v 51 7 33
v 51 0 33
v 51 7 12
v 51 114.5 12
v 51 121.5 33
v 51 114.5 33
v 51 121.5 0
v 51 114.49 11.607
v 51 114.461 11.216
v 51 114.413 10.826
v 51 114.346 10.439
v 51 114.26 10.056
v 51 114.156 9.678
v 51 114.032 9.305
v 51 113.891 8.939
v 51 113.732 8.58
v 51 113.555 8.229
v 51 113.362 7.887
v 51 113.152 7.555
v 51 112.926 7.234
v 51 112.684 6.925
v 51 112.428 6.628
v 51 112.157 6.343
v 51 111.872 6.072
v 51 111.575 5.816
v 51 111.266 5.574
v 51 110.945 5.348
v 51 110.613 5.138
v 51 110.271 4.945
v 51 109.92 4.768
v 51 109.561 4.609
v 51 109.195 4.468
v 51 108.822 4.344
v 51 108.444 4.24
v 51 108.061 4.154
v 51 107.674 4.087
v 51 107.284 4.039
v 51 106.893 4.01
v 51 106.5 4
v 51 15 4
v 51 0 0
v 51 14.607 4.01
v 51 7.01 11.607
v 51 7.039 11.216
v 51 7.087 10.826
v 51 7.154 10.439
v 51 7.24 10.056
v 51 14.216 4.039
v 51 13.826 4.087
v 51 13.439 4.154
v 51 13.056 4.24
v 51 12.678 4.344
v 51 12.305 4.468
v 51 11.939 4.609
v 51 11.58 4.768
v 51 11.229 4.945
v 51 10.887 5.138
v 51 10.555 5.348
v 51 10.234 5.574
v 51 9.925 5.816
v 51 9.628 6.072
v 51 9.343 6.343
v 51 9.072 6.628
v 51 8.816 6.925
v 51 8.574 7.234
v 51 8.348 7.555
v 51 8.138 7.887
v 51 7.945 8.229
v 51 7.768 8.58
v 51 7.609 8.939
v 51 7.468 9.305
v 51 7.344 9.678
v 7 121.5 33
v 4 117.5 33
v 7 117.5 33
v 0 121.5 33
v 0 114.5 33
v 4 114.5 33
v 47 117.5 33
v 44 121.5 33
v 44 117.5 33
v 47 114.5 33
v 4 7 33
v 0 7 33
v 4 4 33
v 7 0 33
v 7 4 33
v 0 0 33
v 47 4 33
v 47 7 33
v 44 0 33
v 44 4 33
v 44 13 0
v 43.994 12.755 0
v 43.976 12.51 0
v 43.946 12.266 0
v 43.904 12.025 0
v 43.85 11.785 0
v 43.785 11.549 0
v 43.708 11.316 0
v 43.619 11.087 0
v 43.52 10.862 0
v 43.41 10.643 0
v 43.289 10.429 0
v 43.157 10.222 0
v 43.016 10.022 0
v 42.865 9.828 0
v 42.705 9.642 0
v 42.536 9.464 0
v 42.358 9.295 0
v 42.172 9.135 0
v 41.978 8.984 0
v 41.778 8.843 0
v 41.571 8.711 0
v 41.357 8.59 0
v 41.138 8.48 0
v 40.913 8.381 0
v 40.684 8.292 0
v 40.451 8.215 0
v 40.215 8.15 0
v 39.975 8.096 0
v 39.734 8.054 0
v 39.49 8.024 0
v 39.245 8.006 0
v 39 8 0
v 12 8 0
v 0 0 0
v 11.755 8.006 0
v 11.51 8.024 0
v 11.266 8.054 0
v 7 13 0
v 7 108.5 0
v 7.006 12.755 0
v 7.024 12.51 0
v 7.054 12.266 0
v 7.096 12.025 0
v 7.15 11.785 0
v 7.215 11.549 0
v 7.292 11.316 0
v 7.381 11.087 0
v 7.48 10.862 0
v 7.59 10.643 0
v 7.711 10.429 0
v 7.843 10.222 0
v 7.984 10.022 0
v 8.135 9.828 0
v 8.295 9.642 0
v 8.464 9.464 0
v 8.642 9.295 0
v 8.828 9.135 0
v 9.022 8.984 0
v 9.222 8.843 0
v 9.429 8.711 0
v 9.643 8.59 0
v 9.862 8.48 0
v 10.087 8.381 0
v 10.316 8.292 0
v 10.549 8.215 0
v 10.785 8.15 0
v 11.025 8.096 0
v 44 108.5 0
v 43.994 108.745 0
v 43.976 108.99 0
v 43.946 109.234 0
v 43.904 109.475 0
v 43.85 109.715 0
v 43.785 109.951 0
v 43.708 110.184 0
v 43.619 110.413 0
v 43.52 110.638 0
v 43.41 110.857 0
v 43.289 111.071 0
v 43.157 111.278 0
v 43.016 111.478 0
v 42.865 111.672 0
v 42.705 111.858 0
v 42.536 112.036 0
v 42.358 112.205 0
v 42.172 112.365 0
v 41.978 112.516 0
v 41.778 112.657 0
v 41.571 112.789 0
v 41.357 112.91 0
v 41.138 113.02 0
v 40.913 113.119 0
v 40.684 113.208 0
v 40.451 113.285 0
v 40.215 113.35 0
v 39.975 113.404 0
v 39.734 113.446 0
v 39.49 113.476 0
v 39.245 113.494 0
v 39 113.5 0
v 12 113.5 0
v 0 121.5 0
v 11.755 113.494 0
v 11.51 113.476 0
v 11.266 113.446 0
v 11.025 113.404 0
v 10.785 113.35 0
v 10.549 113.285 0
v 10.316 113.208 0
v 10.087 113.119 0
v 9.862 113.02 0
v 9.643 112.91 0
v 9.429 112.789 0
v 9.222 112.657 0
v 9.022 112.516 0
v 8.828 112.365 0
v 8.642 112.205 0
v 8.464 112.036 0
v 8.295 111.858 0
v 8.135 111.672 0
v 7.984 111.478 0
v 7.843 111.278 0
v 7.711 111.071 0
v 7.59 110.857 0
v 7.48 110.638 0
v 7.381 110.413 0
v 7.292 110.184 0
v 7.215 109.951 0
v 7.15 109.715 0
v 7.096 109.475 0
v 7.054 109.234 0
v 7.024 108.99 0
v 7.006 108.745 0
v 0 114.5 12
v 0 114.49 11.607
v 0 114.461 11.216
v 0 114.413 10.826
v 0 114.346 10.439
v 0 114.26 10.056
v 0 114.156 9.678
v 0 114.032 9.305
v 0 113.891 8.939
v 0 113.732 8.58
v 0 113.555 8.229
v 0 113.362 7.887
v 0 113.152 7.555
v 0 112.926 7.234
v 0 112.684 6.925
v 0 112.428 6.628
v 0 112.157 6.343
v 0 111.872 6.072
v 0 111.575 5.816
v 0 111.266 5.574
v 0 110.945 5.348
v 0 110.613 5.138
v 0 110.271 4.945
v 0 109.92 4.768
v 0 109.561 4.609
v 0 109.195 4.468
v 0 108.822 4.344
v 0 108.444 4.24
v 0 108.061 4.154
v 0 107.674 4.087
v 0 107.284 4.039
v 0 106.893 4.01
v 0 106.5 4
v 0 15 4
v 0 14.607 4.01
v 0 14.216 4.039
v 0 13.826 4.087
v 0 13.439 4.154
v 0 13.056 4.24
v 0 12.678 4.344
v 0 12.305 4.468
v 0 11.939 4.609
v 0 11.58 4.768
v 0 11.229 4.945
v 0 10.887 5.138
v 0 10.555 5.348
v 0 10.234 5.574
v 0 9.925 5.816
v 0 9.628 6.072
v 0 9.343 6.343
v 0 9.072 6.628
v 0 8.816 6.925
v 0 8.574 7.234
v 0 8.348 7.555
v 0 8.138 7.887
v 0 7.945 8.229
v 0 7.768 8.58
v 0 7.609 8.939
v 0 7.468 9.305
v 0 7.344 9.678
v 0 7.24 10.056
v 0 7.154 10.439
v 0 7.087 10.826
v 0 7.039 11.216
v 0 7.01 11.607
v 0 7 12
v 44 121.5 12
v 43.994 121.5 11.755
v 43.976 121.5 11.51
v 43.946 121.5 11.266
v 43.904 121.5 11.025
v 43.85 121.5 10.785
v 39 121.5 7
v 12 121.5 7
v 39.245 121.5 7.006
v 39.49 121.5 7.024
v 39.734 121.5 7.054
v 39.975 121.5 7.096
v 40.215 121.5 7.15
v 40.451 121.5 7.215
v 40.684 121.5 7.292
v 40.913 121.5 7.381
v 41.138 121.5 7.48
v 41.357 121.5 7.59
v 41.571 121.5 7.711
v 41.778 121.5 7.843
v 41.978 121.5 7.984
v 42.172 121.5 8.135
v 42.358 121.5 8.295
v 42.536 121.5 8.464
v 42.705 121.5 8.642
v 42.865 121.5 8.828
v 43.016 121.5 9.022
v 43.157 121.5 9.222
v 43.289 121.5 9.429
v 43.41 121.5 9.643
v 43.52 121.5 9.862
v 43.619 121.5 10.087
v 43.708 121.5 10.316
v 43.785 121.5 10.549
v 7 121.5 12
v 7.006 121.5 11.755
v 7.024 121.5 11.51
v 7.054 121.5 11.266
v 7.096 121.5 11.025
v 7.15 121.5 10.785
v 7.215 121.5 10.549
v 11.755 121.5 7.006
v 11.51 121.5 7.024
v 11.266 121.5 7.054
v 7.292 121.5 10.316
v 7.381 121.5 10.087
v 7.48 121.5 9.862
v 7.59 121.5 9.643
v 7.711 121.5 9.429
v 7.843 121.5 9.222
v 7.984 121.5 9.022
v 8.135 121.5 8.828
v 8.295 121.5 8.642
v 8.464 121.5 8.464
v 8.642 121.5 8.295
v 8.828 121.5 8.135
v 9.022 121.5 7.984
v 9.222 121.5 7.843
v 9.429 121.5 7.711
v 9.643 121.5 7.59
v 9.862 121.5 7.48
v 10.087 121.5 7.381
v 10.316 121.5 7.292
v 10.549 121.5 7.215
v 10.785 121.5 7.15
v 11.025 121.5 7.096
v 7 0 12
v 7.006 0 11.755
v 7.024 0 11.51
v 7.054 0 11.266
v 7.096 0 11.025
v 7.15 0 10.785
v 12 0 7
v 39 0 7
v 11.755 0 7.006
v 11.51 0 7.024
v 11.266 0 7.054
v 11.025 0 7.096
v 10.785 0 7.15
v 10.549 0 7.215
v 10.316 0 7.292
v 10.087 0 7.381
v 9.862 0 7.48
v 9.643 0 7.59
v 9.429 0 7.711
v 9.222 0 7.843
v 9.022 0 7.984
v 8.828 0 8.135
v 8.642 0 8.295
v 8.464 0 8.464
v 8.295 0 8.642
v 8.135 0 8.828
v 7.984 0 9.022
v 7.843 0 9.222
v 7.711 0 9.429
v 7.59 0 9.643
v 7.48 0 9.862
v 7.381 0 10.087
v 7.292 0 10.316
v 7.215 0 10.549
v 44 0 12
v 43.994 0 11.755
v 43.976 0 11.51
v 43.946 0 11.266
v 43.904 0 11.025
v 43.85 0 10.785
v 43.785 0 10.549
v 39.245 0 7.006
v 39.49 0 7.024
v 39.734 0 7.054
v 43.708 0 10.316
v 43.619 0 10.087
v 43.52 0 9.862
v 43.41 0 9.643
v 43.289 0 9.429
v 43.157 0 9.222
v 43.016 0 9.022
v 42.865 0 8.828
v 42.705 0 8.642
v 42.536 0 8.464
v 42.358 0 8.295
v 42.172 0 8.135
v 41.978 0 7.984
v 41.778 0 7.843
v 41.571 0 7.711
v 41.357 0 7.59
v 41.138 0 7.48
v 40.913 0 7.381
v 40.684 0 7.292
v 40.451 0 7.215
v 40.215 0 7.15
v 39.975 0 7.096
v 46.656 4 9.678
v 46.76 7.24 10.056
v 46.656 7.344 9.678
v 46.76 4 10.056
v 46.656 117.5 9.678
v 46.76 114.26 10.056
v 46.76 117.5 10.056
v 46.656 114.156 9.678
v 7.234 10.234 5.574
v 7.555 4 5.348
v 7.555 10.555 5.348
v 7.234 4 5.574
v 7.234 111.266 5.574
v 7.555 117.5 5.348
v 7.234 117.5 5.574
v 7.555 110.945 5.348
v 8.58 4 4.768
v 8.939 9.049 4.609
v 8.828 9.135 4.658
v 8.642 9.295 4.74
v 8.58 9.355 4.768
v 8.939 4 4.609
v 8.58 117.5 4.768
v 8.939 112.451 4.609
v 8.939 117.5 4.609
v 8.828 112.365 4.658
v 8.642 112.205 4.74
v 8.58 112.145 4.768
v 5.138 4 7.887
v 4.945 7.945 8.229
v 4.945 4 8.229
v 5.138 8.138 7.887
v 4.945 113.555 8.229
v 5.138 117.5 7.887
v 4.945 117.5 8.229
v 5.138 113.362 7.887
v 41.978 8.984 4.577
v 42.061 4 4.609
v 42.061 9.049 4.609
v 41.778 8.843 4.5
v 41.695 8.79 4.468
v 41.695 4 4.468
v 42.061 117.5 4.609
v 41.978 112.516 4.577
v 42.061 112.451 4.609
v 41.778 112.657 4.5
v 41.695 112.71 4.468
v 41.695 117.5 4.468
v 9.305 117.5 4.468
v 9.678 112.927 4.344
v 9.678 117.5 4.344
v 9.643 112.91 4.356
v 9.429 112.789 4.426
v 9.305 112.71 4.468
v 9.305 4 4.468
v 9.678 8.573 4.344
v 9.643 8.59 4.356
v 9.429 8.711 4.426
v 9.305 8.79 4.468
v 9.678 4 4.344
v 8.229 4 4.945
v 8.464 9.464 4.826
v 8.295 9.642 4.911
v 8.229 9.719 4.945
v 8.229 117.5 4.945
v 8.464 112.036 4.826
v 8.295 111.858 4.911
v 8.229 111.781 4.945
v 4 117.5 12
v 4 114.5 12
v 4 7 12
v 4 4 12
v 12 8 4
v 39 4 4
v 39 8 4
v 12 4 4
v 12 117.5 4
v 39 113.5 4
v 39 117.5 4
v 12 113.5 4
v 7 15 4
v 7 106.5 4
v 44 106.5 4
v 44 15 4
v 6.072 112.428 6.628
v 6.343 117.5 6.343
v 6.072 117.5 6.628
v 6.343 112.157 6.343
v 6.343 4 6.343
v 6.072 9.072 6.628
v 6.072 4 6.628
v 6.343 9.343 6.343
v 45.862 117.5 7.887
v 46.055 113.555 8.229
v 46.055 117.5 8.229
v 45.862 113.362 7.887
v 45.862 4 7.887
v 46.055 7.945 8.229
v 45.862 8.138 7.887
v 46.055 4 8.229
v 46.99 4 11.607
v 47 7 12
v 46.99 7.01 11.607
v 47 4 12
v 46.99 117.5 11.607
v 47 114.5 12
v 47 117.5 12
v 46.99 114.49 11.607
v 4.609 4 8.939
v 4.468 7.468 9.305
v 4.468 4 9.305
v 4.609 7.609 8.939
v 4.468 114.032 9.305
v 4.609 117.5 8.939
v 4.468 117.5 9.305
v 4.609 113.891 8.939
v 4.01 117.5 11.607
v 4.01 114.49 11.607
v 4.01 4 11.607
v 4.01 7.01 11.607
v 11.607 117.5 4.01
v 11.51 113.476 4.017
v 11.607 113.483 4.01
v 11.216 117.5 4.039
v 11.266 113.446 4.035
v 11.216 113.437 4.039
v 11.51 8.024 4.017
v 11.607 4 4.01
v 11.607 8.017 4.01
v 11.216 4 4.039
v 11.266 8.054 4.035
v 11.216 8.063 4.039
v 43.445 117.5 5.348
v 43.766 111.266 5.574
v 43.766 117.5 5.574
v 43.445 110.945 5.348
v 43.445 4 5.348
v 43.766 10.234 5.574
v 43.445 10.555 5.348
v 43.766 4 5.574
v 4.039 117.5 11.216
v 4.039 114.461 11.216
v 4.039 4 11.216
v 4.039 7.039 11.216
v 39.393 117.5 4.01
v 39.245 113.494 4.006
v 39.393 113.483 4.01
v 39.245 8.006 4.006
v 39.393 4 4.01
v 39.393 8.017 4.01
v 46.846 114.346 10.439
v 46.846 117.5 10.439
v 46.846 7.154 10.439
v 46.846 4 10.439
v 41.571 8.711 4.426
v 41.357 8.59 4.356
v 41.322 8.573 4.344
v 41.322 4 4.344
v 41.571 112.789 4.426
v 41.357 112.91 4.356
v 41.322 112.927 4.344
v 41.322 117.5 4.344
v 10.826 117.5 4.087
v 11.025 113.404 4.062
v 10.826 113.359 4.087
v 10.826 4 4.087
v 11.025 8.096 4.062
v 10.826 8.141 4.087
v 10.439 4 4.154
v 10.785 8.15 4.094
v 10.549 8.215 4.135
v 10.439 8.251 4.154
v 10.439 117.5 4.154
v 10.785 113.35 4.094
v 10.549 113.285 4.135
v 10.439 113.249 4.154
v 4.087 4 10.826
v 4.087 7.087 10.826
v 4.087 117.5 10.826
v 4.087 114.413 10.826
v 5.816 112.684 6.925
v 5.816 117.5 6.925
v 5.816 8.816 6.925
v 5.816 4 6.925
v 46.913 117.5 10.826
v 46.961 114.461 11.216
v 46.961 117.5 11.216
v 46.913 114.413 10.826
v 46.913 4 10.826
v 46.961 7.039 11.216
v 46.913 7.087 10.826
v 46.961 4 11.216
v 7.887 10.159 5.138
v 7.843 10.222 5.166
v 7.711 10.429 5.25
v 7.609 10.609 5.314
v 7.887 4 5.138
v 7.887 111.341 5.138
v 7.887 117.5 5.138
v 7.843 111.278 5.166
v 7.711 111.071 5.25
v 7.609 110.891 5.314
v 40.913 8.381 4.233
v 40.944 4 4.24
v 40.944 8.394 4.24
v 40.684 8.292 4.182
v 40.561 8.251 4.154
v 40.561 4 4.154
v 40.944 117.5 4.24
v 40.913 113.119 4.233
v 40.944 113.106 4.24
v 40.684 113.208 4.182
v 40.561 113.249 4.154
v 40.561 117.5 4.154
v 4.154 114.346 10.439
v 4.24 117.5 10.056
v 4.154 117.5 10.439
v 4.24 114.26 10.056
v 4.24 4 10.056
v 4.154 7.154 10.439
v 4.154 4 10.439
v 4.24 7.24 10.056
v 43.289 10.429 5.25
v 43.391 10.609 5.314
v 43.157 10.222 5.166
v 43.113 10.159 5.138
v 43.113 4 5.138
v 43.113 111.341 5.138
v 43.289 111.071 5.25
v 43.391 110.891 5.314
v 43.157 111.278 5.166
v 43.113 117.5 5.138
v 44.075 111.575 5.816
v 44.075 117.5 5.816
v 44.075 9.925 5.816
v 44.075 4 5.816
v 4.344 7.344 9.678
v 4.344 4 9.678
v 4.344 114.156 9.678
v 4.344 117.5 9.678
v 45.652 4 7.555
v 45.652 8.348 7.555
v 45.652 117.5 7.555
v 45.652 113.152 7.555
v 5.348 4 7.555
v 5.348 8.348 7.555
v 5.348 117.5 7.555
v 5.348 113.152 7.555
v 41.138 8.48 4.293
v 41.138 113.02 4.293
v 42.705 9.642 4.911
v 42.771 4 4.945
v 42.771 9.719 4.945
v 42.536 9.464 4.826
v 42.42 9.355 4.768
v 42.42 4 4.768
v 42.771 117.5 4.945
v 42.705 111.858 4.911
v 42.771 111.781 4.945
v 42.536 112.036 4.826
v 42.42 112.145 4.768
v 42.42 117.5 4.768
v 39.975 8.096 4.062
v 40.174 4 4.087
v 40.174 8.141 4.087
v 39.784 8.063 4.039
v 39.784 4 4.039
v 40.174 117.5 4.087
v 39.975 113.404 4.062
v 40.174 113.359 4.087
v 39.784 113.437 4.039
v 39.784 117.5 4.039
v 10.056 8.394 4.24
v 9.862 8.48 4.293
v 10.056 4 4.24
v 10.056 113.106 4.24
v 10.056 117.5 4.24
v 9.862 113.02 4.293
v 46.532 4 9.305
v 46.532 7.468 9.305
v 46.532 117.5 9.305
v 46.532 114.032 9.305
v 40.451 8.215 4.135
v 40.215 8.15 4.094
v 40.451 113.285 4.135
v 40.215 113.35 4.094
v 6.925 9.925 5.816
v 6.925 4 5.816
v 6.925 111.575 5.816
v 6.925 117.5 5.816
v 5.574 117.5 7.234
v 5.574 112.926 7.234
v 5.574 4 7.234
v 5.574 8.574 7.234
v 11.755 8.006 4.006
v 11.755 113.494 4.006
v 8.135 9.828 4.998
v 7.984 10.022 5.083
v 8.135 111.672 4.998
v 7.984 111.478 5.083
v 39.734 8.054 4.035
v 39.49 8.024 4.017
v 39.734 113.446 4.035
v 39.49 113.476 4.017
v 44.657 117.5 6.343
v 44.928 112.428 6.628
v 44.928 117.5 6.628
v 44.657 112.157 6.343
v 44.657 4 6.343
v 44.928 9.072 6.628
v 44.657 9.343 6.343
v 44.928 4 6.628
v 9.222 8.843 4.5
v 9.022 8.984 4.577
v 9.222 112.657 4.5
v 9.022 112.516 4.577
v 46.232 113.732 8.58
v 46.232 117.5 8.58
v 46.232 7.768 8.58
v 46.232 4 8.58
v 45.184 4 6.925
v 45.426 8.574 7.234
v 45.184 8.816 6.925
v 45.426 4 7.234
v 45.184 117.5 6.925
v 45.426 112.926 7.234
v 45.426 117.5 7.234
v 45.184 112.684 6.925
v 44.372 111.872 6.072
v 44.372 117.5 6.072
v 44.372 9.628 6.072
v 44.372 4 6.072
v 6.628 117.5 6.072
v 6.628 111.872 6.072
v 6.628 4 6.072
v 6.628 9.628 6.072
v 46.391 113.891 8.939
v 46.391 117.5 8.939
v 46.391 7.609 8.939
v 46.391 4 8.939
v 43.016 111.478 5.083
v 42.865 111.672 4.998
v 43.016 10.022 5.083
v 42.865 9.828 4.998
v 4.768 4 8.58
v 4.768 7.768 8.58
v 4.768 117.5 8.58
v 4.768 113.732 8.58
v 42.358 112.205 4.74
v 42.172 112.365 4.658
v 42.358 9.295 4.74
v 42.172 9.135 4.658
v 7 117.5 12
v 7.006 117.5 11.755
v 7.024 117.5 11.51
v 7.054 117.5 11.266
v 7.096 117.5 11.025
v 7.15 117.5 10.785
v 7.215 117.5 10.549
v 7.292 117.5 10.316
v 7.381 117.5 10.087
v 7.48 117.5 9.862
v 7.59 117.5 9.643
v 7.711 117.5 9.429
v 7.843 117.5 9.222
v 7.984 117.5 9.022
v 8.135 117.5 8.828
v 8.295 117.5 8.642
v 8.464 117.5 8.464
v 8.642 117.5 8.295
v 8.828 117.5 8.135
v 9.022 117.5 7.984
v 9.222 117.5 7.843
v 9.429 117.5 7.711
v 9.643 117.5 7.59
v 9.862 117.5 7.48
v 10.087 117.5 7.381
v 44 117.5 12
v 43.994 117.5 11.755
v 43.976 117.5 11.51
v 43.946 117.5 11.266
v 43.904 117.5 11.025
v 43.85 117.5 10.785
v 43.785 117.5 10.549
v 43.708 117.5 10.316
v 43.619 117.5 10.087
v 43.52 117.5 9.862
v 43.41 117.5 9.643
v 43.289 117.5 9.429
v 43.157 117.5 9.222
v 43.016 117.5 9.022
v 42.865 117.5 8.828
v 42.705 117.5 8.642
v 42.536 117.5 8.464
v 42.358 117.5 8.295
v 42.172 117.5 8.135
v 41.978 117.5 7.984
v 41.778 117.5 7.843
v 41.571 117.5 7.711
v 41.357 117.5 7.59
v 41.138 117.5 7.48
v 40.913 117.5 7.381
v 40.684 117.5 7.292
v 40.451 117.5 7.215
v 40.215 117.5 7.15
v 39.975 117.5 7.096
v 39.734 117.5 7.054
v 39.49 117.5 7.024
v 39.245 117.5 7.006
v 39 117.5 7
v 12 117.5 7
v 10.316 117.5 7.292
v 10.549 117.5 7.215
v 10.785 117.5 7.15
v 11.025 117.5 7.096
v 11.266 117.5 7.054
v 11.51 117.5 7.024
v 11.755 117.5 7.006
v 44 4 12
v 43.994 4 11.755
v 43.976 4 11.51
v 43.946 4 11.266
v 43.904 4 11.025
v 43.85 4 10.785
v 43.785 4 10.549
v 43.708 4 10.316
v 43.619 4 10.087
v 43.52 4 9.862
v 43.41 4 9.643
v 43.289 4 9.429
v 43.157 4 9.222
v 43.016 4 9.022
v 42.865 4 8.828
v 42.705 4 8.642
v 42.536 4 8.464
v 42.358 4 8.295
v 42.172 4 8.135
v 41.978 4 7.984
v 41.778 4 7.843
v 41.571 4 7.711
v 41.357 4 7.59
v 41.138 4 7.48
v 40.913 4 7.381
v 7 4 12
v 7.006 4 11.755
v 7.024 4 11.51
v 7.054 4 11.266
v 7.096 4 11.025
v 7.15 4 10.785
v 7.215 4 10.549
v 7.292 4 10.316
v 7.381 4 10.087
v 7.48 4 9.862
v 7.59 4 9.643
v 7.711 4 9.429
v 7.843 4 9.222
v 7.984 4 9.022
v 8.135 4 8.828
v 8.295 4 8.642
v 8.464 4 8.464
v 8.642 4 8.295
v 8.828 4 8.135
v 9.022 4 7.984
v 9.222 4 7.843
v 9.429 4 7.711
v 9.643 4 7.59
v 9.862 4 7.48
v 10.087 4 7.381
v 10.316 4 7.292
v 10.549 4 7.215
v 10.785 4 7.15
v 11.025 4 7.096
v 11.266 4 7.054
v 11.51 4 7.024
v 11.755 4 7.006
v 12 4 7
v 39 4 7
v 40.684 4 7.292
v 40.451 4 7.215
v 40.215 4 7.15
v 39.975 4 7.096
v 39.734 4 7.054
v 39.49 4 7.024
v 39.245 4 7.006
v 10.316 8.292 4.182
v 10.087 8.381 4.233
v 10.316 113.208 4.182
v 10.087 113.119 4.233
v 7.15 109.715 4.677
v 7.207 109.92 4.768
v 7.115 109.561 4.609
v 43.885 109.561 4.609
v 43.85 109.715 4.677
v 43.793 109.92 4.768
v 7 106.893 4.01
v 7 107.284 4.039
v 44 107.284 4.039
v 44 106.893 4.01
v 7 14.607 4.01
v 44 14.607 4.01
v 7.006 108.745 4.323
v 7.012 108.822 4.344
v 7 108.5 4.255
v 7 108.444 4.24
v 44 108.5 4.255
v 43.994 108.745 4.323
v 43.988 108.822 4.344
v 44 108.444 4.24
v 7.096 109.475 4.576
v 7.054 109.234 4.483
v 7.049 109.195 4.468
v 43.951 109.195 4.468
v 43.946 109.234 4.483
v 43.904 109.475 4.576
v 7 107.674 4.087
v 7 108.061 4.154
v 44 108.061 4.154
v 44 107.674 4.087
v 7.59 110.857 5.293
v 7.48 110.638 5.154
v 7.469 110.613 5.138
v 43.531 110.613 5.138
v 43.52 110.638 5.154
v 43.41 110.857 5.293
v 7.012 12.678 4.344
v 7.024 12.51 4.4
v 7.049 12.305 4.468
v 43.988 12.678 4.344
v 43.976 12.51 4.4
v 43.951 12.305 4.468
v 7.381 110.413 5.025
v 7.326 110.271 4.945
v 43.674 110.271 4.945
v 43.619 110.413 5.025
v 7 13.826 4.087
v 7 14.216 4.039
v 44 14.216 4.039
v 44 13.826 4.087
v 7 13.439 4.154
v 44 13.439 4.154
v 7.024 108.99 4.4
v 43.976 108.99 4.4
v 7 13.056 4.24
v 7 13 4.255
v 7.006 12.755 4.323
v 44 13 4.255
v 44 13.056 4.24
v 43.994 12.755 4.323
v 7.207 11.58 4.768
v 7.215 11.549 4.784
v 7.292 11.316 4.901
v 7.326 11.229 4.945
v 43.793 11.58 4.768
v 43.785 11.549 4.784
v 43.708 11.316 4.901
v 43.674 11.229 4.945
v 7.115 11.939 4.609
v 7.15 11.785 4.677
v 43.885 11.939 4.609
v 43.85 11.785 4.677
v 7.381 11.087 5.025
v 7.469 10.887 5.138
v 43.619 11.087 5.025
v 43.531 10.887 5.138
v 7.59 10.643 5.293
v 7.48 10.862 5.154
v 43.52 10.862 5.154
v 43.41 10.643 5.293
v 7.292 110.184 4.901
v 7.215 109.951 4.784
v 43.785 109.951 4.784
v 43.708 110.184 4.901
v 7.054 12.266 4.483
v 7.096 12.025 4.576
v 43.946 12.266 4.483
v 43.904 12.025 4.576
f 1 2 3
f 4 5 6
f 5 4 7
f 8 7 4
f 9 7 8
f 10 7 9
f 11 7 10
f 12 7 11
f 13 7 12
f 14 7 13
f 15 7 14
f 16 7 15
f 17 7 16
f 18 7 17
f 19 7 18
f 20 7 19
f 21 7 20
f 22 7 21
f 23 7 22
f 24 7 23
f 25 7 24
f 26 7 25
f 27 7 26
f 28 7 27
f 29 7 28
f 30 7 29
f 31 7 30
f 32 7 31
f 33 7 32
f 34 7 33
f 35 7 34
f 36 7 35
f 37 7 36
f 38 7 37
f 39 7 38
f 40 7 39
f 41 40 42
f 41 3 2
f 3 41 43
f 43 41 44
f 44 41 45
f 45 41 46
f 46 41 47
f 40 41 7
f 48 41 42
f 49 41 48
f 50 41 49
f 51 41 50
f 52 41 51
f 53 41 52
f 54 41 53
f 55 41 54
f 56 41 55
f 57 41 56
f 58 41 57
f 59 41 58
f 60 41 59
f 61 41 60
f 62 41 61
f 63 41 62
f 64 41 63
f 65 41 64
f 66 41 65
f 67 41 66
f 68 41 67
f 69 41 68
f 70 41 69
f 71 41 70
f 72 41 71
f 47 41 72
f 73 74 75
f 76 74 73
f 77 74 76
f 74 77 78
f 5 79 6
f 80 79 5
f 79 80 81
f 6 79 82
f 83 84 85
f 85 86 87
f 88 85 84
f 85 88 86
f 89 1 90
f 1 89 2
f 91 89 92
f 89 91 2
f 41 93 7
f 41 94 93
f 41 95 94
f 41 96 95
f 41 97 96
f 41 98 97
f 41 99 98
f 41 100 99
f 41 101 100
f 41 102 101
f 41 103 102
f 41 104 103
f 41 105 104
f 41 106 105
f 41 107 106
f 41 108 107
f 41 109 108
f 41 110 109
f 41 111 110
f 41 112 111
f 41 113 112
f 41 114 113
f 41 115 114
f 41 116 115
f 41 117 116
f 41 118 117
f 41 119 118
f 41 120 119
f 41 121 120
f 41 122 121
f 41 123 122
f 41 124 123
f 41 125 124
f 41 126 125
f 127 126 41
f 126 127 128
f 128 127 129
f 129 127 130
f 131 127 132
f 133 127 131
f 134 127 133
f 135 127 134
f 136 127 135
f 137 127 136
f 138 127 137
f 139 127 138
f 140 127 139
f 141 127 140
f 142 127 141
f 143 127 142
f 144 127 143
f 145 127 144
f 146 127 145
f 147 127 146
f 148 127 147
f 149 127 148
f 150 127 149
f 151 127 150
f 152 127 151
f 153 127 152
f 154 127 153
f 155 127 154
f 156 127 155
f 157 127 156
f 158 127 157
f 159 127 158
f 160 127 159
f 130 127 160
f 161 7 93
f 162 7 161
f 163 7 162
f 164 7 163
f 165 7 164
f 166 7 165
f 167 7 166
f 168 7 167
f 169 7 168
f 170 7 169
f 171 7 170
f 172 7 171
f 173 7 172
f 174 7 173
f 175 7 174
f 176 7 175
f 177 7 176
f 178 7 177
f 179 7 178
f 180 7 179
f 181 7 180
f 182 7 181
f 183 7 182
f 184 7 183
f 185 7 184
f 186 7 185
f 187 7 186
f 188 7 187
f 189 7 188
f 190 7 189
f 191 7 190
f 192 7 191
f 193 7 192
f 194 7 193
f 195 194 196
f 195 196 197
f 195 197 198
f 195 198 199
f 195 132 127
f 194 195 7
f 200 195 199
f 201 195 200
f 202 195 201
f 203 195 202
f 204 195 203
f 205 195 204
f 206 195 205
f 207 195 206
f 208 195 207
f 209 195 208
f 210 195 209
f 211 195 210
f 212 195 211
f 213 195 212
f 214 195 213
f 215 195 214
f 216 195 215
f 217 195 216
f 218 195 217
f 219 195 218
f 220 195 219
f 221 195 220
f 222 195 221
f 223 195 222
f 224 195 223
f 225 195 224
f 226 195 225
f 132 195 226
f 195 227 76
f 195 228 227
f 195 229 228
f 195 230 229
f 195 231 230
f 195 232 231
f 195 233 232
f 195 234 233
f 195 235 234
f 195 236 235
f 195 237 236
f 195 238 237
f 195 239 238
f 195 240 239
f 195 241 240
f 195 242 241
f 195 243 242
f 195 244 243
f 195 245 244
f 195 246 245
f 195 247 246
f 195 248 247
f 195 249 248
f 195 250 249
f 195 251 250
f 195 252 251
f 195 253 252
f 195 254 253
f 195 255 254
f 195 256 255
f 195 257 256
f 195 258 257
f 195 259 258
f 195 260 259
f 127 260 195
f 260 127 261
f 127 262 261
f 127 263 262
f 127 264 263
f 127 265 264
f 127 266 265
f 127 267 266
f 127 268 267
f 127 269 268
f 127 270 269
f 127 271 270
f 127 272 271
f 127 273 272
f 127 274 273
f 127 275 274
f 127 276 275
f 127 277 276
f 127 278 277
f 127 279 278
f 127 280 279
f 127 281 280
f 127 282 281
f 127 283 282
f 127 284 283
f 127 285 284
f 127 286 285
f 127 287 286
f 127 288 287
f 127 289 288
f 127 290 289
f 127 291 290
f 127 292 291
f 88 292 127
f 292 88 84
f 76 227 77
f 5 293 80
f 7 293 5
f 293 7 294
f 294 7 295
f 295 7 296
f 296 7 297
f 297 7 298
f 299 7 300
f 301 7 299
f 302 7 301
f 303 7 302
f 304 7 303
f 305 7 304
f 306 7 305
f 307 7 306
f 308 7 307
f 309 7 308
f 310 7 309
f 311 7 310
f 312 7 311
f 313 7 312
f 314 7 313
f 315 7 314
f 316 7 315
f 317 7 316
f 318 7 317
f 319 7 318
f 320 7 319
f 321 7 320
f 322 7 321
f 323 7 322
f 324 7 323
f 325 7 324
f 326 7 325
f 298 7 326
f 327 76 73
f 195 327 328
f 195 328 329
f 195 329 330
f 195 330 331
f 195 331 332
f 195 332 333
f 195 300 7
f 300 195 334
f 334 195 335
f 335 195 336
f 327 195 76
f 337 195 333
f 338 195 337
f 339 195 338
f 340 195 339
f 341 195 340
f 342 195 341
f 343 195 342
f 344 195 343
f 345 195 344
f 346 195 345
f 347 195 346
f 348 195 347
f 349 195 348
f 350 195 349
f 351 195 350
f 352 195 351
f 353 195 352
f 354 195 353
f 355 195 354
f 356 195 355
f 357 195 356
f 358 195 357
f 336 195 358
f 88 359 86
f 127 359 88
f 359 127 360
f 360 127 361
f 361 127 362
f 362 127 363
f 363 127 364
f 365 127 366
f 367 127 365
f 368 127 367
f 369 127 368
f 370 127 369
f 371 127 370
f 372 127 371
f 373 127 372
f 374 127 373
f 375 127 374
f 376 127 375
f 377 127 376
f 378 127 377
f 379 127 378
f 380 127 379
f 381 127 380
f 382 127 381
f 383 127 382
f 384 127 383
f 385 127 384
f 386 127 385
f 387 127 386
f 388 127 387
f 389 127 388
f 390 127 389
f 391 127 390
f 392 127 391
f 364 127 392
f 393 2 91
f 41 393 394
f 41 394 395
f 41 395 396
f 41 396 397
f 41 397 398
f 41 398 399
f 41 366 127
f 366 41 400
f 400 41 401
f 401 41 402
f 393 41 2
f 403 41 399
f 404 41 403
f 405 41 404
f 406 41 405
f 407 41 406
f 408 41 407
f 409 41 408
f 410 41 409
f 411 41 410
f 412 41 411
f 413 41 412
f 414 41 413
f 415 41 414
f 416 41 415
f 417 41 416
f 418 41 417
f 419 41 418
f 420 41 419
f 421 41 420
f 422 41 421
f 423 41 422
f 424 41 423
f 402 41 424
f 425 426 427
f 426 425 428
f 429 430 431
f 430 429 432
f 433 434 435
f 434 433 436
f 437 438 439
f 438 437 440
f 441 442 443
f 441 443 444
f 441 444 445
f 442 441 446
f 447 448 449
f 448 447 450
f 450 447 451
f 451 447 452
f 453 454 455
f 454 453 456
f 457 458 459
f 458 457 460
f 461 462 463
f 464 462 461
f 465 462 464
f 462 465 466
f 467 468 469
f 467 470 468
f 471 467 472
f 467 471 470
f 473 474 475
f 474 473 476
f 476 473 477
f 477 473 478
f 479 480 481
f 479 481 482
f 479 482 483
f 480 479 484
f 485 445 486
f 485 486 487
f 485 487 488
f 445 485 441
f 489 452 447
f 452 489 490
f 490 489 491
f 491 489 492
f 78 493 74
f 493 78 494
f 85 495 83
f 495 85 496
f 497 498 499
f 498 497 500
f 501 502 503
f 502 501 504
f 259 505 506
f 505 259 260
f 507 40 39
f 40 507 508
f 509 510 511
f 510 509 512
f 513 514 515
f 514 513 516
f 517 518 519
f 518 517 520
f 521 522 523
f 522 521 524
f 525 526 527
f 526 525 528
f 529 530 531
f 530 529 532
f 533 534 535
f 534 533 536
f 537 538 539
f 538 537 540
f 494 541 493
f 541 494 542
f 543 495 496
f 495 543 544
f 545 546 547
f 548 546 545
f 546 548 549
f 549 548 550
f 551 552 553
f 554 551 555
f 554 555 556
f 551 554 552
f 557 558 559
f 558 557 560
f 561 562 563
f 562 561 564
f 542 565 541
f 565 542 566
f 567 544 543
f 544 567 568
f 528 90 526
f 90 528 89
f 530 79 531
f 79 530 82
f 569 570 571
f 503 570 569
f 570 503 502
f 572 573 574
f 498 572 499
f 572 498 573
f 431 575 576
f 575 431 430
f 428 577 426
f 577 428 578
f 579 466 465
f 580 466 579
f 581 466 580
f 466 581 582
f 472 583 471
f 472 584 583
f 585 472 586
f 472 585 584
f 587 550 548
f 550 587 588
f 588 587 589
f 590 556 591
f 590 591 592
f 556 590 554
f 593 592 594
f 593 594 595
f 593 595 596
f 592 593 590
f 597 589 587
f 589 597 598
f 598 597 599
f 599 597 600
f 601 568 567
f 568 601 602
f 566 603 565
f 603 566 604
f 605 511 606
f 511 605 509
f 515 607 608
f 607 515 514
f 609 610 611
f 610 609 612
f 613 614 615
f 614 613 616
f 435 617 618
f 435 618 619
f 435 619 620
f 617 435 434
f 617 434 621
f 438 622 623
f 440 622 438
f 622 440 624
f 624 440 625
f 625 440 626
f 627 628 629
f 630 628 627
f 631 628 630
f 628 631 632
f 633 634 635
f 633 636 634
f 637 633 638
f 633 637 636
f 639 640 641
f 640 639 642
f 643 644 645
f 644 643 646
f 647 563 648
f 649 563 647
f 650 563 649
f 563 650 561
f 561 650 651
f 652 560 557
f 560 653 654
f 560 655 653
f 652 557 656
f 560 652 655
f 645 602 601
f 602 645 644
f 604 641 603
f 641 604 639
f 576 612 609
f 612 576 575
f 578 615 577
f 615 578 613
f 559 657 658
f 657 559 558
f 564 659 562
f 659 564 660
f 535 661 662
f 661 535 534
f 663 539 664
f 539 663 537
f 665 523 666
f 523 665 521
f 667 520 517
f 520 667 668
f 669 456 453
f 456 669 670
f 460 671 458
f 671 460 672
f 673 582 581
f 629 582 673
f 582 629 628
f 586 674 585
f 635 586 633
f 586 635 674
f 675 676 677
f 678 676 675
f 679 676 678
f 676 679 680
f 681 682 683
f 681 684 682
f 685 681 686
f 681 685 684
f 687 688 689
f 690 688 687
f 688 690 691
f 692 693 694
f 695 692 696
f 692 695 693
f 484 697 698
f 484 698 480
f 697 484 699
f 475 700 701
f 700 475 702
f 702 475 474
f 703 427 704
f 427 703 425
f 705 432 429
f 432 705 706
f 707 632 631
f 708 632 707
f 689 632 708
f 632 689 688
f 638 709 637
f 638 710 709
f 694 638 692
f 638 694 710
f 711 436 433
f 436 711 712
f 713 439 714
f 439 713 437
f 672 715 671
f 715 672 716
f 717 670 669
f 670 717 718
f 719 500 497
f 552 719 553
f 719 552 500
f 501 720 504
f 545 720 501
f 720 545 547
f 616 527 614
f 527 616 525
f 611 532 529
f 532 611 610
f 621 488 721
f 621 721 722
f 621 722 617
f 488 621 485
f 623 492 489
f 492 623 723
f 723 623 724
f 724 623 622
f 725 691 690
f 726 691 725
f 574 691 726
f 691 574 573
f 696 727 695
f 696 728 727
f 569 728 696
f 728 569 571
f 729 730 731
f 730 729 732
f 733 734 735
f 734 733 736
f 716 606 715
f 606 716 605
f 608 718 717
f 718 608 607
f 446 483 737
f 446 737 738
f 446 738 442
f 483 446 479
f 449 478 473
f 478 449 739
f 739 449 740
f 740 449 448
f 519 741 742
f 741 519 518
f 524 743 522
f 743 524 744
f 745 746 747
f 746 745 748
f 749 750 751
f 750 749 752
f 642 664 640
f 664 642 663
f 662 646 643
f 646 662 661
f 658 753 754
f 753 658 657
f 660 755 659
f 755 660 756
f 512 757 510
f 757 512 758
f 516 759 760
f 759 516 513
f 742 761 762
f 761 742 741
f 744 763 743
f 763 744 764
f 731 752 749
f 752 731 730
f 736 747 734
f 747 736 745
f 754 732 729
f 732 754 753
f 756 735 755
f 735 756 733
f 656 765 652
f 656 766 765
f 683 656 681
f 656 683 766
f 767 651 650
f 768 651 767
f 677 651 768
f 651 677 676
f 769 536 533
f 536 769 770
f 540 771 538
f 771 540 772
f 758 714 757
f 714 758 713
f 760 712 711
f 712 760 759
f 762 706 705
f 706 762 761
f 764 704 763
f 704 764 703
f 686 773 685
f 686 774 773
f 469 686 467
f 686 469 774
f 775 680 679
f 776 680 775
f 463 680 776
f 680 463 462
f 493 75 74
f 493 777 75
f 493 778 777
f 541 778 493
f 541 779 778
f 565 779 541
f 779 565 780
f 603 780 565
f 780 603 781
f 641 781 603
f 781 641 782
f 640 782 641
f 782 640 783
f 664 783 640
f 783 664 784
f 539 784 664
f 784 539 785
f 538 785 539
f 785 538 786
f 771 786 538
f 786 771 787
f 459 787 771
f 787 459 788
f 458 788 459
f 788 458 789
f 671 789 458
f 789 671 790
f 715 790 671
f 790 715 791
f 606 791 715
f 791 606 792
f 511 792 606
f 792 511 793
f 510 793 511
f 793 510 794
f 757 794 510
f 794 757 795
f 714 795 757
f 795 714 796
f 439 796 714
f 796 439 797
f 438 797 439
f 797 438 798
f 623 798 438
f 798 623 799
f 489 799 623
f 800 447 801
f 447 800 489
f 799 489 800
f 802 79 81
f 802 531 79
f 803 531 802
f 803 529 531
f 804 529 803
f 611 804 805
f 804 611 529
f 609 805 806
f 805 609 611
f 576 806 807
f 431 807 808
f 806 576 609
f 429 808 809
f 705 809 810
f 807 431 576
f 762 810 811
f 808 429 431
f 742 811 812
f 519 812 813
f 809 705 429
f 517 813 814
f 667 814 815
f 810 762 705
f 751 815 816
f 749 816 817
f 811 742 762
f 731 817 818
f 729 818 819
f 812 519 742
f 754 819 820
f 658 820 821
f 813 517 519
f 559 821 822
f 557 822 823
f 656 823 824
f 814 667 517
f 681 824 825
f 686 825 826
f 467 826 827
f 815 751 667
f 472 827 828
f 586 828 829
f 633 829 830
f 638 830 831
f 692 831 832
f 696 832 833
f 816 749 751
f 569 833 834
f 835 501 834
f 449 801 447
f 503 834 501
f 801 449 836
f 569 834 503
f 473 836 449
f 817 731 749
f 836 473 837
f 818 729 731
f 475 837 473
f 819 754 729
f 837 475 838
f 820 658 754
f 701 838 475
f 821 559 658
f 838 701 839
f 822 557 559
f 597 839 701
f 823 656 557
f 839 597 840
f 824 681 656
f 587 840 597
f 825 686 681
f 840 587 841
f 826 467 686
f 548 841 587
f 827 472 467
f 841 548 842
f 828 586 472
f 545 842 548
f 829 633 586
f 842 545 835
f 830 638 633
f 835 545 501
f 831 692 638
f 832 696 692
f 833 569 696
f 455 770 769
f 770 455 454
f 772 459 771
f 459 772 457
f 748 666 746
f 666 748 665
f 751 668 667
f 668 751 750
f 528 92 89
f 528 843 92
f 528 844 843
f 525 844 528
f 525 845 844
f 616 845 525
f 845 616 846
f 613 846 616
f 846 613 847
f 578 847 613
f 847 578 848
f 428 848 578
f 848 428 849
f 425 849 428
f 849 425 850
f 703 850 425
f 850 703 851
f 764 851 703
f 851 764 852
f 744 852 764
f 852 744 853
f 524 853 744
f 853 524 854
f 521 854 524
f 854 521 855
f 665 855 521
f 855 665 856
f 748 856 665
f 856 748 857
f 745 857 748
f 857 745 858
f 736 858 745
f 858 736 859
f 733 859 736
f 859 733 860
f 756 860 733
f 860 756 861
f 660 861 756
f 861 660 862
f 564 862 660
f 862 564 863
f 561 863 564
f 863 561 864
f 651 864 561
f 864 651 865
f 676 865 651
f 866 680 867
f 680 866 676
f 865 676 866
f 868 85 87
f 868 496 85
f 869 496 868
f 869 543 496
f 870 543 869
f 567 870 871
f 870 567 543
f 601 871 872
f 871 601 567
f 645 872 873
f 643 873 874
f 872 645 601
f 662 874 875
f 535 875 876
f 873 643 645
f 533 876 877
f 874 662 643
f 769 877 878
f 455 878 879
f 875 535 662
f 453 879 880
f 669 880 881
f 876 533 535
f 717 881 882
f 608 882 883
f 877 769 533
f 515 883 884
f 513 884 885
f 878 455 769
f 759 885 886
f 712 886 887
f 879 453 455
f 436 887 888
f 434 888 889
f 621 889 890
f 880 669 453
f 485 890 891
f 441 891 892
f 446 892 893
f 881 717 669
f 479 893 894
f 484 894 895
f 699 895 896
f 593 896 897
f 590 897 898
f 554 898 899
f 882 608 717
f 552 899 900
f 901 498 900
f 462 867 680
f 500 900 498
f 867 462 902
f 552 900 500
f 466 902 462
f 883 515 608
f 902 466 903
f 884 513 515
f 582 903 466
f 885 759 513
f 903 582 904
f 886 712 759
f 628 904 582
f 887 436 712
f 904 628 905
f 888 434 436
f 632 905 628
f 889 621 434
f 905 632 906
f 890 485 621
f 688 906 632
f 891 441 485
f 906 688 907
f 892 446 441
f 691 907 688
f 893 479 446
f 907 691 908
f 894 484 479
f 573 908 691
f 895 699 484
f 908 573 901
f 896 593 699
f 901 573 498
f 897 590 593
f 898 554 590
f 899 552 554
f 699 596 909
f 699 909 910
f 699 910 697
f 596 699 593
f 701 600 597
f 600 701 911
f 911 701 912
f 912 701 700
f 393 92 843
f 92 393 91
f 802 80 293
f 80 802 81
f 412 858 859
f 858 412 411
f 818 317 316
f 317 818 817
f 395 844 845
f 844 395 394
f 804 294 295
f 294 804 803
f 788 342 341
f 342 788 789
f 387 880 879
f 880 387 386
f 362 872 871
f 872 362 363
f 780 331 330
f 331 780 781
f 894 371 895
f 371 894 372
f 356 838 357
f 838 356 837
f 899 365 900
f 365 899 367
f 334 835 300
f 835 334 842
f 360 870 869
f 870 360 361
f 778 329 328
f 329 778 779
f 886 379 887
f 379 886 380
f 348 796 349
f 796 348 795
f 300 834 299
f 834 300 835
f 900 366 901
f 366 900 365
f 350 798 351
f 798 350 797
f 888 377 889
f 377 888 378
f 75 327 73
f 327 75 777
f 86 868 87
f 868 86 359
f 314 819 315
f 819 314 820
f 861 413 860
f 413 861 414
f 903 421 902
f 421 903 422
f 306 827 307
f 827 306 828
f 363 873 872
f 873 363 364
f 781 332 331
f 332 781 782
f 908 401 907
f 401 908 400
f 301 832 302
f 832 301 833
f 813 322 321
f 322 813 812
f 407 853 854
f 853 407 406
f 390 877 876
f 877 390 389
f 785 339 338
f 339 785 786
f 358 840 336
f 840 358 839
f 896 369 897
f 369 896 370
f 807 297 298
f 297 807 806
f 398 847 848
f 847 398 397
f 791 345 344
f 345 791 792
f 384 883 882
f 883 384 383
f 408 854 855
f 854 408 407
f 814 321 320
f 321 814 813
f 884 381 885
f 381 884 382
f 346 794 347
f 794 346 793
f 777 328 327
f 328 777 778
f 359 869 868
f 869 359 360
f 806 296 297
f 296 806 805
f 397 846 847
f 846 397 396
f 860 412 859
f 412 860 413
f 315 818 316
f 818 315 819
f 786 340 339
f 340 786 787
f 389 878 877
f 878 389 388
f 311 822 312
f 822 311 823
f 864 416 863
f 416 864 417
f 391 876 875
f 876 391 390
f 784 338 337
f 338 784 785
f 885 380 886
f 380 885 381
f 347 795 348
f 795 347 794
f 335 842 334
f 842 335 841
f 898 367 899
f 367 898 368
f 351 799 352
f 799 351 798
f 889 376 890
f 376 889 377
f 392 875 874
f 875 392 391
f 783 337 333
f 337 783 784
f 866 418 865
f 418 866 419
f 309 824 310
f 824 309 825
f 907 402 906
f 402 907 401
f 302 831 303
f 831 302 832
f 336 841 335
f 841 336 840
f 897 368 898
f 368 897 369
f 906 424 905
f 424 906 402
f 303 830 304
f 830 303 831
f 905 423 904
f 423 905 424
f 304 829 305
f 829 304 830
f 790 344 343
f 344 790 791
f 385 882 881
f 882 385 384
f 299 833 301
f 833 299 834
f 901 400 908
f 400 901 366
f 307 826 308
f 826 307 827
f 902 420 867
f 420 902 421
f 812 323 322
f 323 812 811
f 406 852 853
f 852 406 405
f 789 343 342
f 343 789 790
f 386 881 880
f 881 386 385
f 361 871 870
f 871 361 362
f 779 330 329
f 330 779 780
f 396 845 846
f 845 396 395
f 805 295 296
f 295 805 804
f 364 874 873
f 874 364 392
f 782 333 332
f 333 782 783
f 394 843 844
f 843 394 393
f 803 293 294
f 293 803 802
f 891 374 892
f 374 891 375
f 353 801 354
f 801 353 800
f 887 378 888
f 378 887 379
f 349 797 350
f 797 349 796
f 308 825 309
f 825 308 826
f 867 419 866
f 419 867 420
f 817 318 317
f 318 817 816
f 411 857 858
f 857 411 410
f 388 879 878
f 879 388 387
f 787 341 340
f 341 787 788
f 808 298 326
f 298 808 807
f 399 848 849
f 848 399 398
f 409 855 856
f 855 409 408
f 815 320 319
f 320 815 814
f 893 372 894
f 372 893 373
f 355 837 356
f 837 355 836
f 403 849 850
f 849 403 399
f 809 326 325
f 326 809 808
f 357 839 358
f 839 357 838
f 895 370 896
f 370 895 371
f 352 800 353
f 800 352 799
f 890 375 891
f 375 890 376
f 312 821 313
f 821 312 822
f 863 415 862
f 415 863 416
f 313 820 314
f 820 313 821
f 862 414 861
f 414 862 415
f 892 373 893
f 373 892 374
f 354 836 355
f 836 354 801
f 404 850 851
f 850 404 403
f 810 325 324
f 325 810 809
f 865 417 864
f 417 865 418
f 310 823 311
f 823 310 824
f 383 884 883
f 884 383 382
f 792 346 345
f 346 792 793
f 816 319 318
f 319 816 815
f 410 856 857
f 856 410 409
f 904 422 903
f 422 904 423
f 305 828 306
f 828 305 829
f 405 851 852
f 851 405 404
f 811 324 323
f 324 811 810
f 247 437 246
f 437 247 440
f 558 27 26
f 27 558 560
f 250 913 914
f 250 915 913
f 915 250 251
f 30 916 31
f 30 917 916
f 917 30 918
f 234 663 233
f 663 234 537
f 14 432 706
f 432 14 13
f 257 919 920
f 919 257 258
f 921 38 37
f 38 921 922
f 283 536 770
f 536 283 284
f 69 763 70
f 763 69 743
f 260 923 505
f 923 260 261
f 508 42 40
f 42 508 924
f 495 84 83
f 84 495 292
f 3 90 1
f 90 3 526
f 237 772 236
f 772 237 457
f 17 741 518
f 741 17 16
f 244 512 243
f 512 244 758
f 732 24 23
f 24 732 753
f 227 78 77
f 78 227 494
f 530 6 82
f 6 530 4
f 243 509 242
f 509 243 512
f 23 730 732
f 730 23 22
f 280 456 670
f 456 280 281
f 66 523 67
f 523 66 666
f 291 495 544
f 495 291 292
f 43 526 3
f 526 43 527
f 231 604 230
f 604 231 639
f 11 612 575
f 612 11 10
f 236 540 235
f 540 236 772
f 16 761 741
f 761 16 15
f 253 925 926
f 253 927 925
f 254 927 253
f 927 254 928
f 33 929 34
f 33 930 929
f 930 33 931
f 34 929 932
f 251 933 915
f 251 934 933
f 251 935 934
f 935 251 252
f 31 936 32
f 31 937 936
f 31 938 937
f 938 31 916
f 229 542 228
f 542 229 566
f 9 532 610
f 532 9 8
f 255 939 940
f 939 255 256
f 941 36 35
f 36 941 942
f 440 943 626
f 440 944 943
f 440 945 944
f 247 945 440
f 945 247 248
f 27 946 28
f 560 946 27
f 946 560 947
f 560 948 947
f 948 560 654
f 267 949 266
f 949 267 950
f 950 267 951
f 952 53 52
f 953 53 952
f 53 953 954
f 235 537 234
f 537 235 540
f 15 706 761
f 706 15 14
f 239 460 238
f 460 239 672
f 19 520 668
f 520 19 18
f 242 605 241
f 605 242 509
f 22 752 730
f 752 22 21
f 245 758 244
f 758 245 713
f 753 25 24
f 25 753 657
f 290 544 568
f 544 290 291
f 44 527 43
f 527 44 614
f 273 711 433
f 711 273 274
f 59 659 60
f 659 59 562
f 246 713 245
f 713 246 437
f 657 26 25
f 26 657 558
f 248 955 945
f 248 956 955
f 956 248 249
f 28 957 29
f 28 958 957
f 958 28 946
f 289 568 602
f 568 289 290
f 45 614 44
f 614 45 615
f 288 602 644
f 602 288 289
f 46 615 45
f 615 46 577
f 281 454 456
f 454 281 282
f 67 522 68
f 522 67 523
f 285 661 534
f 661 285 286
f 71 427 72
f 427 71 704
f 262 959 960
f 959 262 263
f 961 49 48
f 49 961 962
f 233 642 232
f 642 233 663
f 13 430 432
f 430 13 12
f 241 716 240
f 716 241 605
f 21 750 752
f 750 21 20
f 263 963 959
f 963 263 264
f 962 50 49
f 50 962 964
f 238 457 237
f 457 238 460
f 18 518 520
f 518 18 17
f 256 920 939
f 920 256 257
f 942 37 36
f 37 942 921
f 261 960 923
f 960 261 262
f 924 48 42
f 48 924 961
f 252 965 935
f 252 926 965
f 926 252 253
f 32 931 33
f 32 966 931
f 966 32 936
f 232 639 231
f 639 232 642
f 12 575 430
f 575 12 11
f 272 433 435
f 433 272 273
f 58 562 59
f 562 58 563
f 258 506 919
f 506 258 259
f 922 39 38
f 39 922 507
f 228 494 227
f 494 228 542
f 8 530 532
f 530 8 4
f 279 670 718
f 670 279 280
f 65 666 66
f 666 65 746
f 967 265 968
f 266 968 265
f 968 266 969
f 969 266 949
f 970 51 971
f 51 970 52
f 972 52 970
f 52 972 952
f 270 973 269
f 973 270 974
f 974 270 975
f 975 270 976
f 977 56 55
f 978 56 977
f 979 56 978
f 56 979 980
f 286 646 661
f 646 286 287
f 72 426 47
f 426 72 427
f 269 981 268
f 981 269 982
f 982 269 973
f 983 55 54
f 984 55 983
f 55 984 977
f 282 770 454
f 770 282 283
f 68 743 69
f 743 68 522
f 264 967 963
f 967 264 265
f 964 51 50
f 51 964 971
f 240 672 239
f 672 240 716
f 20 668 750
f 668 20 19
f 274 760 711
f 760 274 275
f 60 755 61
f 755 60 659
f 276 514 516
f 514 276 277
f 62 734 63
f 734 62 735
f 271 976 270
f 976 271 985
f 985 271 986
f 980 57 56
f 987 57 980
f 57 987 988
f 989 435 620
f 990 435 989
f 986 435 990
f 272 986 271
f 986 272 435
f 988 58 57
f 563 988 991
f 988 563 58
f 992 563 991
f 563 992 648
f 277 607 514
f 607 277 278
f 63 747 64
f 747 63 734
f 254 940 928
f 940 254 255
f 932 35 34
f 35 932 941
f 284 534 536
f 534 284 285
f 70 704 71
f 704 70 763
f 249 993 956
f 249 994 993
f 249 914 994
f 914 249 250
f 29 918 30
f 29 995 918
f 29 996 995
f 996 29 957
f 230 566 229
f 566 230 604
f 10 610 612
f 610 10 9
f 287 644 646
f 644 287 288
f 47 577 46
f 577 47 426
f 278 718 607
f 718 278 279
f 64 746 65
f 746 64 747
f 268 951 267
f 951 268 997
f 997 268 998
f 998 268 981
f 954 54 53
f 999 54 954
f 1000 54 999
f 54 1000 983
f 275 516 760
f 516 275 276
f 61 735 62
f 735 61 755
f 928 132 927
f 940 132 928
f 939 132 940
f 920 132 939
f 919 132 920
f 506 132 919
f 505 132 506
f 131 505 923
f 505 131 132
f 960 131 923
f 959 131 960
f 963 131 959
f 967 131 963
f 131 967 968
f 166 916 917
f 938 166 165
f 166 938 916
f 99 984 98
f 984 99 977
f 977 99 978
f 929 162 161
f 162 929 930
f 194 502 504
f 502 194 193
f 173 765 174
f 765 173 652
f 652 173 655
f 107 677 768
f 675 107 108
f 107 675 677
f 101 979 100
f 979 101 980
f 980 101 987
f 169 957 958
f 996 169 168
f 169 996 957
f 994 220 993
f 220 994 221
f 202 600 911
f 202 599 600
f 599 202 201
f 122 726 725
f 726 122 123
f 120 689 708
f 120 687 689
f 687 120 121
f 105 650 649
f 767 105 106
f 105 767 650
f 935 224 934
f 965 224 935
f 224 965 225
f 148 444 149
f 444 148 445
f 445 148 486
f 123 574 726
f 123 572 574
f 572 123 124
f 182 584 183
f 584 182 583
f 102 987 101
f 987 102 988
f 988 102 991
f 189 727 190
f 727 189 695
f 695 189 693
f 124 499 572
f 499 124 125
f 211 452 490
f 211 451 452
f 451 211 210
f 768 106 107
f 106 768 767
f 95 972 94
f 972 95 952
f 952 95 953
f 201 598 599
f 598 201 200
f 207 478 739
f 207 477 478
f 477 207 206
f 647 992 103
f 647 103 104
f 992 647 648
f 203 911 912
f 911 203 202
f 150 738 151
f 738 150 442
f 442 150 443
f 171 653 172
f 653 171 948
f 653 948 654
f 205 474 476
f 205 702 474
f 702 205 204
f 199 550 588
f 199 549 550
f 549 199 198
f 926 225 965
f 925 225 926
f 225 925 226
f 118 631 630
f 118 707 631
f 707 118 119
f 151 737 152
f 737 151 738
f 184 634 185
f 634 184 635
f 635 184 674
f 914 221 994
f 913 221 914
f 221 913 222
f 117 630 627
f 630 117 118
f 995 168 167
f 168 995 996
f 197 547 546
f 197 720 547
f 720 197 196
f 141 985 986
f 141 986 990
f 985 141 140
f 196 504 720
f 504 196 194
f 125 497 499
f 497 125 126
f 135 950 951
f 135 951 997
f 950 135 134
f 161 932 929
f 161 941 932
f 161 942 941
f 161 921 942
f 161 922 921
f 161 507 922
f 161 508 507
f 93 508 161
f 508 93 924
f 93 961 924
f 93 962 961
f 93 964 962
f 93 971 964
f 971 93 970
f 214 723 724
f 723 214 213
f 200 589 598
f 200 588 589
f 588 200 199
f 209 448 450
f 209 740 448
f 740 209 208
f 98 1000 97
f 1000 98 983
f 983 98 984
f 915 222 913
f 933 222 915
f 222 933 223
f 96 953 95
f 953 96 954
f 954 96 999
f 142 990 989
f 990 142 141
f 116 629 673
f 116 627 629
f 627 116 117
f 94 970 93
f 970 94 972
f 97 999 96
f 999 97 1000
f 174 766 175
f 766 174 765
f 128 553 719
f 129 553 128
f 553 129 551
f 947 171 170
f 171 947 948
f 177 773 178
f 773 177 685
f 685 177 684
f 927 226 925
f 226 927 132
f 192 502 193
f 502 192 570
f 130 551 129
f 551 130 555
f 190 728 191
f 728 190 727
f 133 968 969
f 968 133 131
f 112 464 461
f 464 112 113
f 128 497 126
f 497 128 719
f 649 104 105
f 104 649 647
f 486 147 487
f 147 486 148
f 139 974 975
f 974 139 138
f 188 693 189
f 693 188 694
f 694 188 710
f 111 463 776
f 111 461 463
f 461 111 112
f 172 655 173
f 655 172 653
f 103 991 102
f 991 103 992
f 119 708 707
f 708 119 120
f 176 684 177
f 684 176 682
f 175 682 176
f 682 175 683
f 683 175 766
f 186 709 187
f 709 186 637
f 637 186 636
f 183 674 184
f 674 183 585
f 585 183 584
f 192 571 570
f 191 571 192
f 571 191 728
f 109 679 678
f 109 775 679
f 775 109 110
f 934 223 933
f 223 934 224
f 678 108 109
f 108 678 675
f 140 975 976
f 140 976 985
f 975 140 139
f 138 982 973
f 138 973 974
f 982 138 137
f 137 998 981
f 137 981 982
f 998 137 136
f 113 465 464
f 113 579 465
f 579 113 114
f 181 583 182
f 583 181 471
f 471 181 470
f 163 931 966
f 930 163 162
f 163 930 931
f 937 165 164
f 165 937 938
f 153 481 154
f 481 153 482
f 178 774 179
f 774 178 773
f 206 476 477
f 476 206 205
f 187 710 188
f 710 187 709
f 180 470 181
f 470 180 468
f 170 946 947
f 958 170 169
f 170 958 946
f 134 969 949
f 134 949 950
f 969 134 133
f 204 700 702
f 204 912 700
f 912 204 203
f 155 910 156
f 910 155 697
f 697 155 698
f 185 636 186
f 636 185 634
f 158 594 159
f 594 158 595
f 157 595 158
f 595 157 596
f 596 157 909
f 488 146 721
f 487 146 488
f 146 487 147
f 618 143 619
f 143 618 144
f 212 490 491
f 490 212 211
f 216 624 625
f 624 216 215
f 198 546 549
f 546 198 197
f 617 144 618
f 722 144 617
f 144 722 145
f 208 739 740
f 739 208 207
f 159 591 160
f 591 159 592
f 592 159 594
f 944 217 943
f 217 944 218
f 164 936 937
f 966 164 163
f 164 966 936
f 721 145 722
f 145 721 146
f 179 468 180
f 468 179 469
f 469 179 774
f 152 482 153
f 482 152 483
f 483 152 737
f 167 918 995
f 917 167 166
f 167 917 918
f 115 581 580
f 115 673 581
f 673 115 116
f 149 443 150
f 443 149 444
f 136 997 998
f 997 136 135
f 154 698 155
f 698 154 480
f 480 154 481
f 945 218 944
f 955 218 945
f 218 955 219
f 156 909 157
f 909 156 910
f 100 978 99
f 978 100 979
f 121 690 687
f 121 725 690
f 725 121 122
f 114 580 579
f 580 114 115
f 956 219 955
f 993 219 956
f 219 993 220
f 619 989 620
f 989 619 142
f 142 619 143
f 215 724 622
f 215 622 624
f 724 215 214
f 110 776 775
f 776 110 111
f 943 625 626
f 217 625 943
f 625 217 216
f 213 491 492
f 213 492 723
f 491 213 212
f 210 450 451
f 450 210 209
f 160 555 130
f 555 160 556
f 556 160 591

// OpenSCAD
// file: audio_interface.scad
module audio_interface(depth, width, height, corner_radius) {
    translate([0,depth,0])
    rotate([90,0,0])
    hull() {
        translate([corner_radius,corner_radius,0]) 
        cylinder(h=depth,r=corner_radius);
        
        translate([width-corner_radius,corner_radius,0]) 
        cylinder(h=depth,r=corner_radius);
        
        translate([corner_radius,height-corner_radius,0]) 
        cylinder(h=depth,r=corner_radius);
        
        translate([width-corner_radius,height-corner_radius,0]) 
        cylinder(h=depth,r=corner_radius);
    }
}
// main file
include <audio_interface.scad>

$fn=128;



depth = 113.5;
width = 43;
height = 165;
thickness = 4;
lip=3;
corner_r=8;


difference() {
//    audio_interface(depth+thickness*2,width+thickness*2, height/4, corner_r);
    cube([width+thickness*2,depth+thickness*2,height/5]);
    
    //Subtract the audio interface
    translate([thickness,thickness,thickness])
    audio_interface(depth, width, height, corner_r);
    
    //Subtract front and back face openings
    translate([thickness+lip,0,thickness+lip])
    audio_interface(depth+thickness*2, width-lip*2, height, corner_r-lip);
    
    //Subtract side openings
    translate([width+1+thickness*2,thickness+lip,thickness])
    rotate([0,0,90])
    audio_interface(width+1+thickness*2, depth-lip*2, height, corner_r);
    
    //Subtract bottom opening
    translate([thickness+lip, depth, 0])
    rotate([90,0,0])
    audio_interface(height/5, width-lip*2, depth-thickness*2, 5);
}
